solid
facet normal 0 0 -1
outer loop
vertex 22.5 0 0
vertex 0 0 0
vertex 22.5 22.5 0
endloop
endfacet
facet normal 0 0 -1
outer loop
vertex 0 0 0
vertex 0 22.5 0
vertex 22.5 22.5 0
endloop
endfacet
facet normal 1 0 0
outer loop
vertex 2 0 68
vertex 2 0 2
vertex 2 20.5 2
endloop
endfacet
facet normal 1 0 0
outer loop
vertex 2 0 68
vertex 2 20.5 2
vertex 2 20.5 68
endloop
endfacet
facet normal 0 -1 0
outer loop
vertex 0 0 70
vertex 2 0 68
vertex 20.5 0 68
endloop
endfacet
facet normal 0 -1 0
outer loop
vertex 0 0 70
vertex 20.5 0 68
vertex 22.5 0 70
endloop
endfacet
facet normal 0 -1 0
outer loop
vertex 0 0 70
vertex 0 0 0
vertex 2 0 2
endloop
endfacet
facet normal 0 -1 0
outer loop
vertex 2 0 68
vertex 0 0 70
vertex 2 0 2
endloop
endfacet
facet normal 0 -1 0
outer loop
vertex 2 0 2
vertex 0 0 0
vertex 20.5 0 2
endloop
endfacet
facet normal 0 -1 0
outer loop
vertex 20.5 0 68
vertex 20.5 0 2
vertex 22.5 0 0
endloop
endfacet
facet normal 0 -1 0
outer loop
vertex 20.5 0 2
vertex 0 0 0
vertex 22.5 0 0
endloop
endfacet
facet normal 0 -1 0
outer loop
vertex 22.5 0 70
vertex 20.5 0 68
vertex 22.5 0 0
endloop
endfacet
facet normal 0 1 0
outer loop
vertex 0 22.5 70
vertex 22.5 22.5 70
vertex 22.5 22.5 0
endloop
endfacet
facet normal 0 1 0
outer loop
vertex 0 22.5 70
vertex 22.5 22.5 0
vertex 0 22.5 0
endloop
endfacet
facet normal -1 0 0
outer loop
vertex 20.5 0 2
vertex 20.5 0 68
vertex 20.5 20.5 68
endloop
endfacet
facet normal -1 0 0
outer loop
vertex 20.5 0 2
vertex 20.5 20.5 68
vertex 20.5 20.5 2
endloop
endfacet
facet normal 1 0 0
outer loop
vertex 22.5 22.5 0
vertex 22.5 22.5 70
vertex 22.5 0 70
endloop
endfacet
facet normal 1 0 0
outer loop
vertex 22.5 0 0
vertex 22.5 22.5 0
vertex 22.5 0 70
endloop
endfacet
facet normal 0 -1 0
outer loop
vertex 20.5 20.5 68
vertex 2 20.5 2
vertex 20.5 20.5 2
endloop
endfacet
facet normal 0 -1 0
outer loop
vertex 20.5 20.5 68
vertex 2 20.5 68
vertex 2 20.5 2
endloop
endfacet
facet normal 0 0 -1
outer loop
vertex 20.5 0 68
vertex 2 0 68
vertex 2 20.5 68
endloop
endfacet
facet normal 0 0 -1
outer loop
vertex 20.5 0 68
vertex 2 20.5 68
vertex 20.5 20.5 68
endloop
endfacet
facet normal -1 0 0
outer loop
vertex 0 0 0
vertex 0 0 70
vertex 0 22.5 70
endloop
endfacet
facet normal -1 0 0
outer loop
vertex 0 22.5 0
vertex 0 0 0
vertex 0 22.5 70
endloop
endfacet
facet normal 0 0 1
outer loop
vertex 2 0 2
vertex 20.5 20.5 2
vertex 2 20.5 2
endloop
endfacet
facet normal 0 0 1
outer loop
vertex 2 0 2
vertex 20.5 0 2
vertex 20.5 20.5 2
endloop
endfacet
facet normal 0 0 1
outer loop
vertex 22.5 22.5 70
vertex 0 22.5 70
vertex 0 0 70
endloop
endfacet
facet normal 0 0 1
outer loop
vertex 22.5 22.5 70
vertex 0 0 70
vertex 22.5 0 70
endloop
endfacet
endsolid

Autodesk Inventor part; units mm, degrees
ref_plane "YZ Plane" through (0, 0, 0) normal (1, 0, 0) x (0, 1, 0)
ref_plane "XZ Plane" through (0, 0, 0) normal (0, 1, 0) x (-1, 0, 0)
ref_plane "XY Plane" through (0, 0, 0) normal (0, 0, 1) x (1, 0, 0)
sketch "Sketch1" plane through (0, 0, 0) normal (0, 0, 1) x (1, 0, 0)
  line L0 (0, 0) -> (22.5, 0)
  line L1 (22.5, 0) -> (22.5, 22.5)
  line L2 (22.5, 22.5) -> (0, 22.5)
  line L3 (0, 22.5) -> (0, 0)
  line L4 (0, 0) -> (20.5, 0)
  line L5 (20.5, 0) -> (20.5, 2)
  line L6 (20.5, 2) -> (0, 2)
  line L7 (0, 2) -> (0, 0)
  line L8 (22.5, 0) -> (20.5, 0)
  line L9 (20.5, 0) -> (20.5, 20.5)
  line L10 (20.5, 20.5) -> (22.5, 20.5)
  line L11 (22.5, 20.5) -> (22.5, 0)
  line L12 (22.5, 22.5) -> (2, 22.5)
  line L13 (2, 22.5) -> (2, 20.5)
  line L14 (2, 20.5) -> (22.5, 20.5)
  line L15 (22.5, 20.5) -> (22.5, 22.5)
  line L16 (0, 22.5) -> (2, 22.5)
  line L17 (2, 22.5) -> (2, 2)
  line L18 (2, 2) -> (0, 2)
  line L19 (0, 2) -> (0, 22.5)
  line L20 (2, 2) -> (20.5, 2)
  line L21 (20.5, 2) -> (20.5, 20.5)
  line L22 (20.5, 20.5) -> (2, 20.5)
  line L23 (2, 20.5) -> (2, 2)
  dimension "d0" = 22.5
  dimension "d1" = 22.5
  dimension "d2" = 20.5
  dimension "d3" = 2
  dimension "d4" = 2
  dimension "d5" = 20.5
  dimension "d6" = 20.5
  dimension "d7" = 2
  dimension "d8" = 2
  dimension "d9" = 20.5
  dimension "d10" = 18.5
  dimension "d11" = 18.5
extrude "Extrusion1" add sketch "Sketch1" along normal blind 69
sketch "Sketch2" plane through (0, 0, 0) normal (0, -1, 0) x (1, 0, 0)
  line L0 (0, 69) -> (22.5, 69) projected
  line L1 (22.5, 69) -> (20.5, 69)
  line L2 (20.5, 69) -> (20.5, 2)
  line L3 (20.5, 2) -> (22.5, 2)
  line L4 (22.5, 2) -> (22.5, 69)
  line L5 (20.5, 2) -> (2, 2)
  line L6 (2, 2) -> (2, 68)
  line L7 (2, 68) -> (20.5, 68)
  line L8 (20.5, 68) -> (20.5, 2)
  point P0 (0, 0)
  dimension "d14" = 2
  dimension "d15" = 67
  dimension "d16" = 18.5
  dimension "d17" = 66
extrude "Extrusion2" cut sketch "Sketch2" against normal blind 18.5 contours L2 L5 L6 L7
sketch "Sketch3" plane through (0, 0, 69) normal (0, 0, 1) x (1, 0, 0)
  line L0 (22.5, 22.5) -> (0, 22.5) projected
  line L1 (0, 0) -> (22.5, 0) projected
  line L2 (0, 22.5) -> (22.5, 22.5)
  line L3 (22.5, 22.5) -> (22.5, 0)
  line L4 (22.5, 0) -> (0, 0)
  line L5 (0, 0) -> (0, 22.5)
  dimension "d20" = 22.5
  dimension "d21" = 22.5
extrude "Extrusion3" add sketch "Sketch3" along normal blind 1
sketch "Sketch4" plane through (0, 18.5, 0) normal (0, -1, 0) x (1, 0, 0)
  point P0 (0, 0)
sketch "Sketch5" plane through (0, 18.5, 0) normal (0, -1, 0) x (1, 0, 0)
  line L0 (20.5, 2) -> (2, 2) projected
  line L1 (20.5, 68) -> (20.5, 2) projected
  line L2 (2, 2) -> (20.5, 2)
  line L3 (20.5, 2) -> (20.5, 68)
  line L4 (20.5, 68) -> (2, 68)
  line L5 (2, 68) -> (2, 2)
  point P0 (0, 0)
  dimension "d24" = 18.5
  dimension "d25" = 66
extrude "Extrusion4" cut sketch "Sketch5" against normal blind 2
properties part number "1-Battery-Case"
